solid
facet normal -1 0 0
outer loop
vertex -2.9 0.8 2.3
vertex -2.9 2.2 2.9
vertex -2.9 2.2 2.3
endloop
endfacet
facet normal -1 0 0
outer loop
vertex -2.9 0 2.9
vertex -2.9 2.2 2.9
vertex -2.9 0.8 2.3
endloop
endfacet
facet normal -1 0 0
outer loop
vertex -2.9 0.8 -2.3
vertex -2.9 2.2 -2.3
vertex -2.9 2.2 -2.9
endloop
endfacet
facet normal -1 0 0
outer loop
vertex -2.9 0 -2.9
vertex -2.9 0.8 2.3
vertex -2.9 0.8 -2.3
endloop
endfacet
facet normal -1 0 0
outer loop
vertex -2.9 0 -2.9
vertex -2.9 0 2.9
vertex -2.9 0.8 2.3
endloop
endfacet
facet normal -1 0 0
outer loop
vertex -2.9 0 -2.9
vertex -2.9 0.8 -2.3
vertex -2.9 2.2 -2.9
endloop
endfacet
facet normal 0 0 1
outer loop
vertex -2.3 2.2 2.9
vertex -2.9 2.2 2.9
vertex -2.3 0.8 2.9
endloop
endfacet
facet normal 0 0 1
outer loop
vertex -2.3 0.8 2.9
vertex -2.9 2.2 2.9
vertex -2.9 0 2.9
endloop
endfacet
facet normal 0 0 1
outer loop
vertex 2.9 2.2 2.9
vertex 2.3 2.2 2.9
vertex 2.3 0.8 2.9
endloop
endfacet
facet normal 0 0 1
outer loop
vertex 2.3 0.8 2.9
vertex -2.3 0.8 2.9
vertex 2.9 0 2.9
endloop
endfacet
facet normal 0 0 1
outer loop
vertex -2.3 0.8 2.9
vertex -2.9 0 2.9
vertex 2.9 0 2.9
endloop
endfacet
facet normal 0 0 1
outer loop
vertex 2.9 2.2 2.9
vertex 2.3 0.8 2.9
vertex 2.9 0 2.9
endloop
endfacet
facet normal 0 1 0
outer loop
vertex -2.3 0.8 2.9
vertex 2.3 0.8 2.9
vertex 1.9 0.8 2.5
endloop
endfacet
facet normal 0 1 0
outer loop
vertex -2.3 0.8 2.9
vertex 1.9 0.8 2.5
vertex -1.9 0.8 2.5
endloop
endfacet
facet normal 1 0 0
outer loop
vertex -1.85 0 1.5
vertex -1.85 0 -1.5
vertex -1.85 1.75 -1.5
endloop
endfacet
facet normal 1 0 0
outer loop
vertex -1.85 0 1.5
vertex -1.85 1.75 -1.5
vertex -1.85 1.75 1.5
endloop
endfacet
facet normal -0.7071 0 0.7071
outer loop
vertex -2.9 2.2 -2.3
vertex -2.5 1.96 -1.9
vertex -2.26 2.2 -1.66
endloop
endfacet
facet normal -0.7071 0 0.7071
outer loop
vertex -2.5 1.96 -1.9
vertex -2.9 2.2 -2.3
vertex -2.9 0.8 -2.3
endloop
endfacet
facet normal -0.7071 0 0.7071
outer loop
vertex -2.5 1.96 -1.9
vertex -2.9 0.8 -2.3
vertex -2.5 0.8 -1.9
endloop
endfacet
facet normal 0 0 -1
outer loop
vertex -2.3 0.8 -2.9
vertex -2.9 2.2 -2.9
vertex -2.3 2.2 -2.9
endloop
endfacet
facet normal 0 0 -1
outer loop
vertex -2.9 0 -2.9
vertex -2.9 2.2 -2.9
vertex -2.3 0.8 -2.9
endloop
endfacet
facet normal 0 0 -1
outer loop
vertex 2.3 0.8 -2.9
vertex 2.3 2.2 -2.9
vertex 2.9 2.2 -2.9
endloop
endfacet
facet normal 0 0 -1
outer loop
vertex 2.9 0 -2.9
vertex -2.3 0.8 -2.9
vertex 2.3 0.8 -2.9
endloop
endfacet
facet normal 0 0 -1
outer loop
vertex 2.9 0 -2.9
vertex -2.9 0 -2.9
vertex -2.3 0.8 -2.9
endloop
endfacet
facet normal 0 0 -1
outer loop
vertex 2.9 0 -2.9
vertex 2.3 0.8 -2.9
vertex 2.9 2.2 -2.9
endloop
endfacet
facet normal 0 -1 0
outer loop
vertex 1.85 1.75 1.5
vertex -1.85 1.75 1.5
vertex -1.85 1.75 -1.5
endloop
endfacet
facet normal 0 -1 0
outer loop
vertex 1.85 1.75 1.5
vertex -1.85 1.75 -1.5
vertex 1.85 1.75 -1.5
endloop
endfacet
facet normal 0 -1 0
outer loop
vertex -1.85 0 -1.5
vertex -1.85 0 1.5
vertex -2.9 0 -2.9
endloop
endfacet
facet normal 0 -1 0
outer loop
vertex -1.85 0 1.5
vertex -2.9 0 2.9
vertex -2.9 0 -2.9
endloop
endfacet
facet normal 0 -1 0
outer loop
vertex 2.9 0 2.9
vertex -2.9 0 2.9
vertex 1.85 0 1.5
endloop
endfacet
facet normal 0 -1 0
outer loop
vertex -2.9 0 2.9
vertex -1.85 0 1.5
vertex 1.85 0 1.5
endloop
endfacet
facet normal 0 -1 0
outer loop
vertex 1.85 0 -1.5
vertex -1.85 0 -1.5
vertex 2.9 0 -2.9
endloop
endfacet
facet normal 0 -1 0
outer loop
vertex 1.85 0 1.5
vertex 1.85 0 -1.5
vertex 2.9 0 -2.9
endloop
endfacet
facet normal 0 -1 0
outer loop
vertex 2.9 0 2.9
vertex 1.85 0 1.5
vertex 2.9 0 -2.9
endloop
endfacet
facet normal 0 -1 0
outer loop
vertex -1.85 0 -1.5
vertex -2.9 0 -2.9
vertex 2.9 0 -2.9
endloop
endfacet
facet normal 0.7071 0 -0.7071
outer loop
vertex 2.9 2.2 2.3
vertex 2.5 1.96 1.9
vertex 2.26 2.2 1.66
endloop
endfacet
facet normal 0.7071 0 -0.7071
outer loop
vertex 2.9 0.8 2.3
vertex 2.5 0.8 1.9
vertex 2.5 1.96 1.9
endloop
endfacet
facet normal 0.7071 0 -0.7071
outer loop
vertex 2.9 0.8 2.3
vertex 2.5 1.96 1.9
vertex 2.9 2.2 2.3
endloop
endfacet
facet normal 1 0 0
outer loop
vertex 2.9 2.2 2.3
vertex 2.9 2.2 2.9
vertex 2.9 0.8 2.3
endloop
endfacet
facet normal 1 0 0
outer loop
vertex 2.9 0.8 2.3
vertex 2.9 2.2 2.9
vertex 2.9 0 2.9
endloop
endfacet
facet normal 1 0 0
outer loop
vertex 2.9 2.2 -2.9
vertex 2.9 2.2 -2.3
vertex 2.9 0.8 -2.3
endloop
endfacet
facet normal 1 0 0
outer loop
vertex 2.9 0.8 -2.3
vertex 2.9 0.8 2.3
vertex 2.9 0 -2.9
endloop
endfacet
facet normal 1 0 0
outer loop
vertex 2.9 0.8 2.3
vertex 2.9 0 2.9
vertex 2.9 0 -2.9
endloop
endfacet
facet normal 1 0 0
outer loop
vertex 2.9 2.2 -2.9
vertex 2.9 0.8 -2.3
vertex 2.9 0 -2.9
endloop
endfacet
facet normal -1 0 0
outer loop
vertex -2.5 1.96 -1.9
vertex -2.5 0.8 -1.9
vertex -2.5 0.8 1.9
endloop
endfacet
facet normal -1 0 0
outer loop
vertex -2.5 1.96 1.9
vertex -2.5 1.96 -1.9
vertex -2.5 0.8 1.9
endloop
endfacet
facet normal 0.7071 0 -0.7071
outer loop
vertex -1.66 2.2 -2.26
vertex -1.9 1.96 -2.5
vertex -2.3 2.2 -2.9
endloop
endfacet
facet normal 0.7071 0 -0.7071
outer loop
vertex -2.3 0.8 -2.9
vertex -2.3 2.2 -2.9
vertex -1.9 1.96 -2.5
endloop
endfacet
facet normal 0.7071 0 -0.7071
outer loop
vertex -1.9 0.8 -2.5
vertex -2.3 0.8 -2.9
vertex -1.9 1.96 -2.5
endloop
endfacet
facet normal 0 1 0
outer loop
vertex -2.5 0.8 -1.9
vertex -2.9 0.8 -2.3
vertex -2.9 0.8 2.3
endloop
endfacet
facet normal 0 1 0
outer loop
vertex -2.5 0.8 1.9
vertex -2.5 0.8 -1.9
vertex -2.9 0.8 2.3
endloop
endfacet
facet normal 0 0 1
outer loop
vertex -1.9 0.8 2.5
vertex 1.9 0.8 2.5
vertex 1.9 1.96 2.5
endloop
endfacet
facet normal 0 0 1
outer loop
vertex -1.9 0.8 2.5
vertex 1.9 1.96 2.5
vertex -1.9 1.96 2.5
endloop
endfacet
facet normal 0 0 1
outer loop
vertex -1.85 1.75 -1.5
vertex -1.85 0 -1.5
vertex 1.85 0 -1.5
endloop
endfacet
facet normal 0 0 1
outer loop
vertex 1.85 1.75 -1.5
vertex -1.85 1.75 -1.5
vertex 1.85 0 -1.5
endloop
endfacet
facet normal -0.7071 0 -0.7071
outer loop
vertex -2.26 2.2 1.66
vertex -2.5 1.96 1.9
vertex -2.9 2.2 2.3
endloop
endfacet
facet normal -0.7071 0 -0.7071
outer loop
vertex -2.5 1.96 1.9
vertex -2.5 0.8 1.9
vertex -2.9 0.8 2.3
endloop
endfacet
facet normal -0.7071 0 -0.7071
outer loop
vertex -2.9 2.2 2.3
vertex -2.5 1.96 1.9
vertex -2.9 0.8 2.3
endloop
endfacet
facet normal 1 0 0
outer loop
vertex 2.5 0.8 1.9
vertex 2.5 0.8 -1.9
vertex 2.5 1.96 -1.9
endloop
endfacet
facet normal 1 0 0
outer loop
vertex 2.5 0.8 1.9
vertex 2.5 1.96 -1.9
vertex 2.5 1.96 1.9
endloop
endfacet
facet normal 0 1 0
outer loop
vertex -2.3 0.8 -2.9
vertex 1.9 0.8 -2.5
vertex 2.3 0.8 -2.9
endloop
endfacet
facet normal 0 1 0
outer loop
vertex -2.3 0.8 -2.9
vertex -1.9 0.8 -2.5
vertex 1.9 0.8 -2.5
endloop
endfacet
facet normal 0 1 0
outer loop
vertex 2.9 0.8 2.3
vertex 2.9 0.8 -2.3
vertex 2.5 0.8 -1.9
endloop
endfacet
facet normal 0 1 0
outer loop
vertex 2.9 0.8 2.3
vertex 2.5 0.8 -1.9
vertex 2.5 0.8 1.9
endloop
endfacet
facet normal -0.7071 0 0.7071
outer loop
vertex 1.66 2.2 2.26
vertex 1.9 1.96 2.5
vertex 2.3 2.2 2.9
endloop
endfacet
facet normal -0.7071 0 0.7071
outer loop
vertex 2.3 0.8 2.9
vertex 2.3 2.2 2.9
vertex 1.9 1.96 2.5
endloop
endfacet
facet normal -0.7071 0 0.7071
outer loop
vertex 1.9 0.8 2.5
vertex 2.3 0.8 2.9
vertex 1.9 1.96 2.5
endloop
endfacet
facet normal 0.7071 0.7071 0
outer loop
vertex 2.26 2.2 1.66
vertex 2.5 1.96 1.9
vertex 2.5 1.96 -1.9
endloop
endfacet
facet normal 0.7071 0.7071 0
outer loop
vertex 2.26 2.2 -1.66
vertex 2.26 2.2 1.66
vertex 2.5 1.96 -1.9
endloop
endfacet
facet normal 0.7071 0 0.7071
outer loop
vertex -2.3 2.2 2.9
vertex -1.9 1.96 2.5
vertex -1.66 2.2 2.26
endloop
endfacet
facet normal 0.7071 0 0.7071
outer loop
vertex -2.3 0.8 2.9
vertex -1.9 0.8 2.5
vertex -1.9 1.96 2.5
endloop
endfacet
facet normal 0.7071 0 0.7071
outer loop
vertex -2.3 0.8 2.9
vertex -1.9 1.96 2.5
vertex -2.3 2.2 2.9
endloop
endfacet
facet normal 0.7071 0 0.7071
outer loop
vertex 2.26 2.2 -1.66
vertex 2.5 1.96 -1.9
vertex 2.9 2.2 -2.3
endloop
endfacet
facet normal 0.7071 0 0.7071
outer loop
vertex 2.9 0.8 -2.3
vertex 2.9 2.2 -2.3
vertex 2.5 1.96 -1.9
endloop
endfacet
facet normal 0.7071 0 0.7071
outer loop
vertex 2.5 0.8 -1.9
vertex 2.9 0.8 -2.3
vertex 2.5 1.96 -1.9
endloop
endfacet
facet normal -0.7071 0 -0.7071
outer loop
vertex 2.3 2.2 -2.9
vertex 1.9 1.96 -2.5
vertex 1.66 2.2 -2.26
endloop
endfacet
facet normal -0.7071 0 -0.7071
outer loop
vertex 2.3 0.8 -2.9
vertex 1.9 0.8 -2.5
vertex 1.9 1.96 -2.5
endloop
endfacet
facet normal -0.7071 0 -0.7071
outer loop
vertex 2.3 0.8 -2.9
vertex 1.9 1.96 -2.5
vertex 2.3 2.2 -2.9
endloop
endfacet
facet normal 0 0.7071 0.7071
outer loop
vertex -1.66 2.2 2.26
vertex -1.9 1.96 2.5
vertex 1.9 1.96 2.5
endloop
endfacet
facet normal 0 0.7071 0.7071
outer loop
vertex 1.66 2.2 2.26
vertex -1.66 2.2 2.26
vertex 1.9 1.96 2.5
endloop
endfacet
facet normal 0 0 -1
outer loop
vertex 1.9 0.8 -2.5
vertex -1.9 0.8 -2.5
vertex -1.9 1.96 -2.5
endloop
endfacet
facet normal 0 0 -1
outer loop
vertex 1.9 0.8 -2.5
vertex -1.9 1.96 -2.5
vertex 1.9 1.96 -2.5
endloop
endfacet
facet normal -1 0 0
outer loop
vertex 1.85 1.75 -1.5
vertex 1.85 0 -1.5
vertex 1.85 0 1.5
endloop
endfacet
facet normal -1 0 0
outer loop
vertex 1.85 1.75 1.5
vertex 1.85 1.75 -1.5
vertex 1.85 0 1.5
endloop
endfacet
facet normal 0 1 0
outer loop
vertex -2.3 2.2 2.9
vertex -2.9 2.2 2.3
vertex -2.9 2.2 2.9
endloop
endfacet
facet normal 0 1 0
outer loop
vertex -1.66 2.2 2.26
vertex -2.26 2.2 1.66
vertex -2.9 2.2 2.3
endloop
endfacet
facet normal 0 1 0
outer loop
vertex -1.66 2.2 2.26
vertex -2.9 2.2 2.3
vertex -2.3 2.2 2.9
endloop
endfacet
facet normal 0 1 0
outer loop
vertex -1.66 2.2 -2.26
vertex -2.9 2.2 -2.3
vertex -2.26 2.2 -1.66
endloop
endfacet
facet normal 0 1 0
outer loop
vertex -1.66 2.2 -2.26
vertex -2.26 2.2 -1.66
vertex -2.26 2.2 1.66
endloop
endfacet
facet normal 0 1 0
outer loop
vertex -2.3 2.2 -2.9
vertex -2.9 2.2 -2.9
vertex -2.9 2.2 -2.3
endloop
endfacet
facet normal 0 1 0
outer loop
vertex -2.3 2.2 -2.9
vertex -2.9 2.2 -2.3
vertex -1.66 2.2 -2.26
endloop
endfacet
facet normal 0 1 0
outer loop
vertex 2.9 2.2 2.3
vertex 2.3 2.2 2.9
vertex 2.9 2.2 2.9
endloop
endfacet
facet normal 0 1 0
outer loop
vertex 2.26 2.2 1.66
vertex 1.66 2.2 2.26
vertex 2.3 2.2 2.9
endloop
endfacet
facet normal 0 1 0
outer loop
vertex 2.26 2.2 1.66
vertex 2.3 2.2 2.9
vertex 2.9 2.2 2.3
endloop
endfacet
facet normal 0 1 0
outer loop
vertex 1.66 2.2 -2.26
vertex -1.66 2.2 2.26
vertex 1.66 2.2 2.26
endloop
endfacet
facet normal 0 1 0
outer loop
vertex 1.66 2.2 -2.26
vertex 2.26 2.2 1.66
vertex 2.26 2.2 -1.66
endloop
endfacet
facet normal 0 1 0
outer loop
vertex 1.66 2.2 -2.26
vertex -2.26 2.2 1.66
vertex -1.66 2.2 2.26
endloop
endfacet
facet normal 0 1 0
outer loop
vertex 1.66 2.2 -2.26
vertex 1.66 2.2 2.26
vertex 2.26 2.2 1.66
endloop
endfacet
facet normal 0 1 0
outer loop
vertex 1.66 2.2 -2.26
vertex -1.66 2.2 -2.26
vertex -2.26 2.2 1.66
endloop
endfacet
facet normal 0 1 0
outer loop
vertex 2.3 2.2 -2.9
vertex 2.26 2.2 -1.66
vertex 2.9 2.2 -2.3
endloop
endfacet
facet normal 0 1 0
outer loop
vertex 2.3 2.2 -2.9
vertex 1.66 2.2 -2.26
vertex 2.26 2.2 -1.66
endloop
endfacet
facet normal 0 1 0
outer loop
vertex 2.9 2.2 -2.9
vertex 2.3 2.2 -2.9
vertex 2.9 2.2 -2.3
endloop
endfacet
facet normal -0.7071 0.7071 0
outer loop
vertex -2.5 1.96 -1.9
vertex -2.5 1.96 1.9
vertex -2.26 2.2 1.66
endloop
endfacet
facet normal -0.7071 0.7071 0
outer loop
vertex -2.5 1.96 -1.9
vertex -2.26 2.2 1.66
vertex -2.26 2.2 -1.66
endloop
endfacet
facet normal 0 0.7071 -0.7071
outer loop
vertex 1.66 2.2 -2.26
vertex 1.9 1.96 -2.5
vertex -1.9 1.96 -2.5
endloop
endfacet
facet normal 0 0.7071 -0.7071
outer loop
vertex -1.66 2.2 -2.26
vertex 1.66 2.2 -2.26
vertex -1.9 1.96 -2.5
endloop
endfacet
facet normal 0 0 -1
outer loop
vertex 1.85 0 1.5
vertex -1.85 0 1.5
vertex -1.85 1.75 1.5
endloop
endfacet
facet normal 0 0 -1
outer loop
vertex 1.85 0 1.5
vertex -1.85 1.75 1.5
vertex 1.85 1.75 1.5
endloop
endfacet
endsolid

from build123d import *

# Parameters (mm, degrees)
SKETCH_1_W          = 5.8
SKETCH_1_H          = 5.8
EXTRUDE_1_DEPTH     = 2.2
SKETCH_3_W          = 3.7
SKETCH_3_H          = 3
CUT_EXTRUDE_2_DEPTH = 1.75
CUT_EXTRUDE_START   = -0.8
CUT_EXTRUDE_1_DEPTH = 4.854030511
CHAMFER_1_SIZE      = 0.24


with BuildPart() as part:
    # 草图1 → 凸台-拉伸1 (new body)
    with BuildSketch(Plane(origin=(0, 0, 0), x_dir=(1, 0, 0), z_dir=(0, 1, 0))):
        Rectangle(SKETCH_1_W, SKETCH_1_H)
    extrude(amount=EXTRUDE_1_DEPTH)

    # 草图3 → 切除-拉伸2 (cut)
    with BuildSketch(Plane.XZ):
        Rectangle(SKETCH_3_W, SKETCH_3_H)
    extrude(amount=-CUT_EXTRUDE_2_DEPTH, mode=Mode.SUBTRACT)

    # 草图2 → 切除-拉伸1 (cut, through all)
    with BuildSketch(Plane.XZ.offset(CUT_EXTRUDE_START)):
        Polygon((-2.9, 2.3), (-2.9, -2.3), (-2.5, -1.9), (-2.5, 1.9), align=None)
        Polygon((-1.9, 2.5), (-2.3, 2.9), (2.3, 2.9), (1.9, 2.5), align=None)
        Polygon((2.5, 1.9), (2.9, 2.3), (2.9, -2.3), (2.5, -1.9), align=None)
        Polygon((1.9, -2.5), (2.3, -2.9), (-2.3, -2.9), (-1.9, -2.5), align=None)
    extrude(amount=-CUT_EXTRUDE_1_DEPTH, mode=Mode.SUBTRACT)

    # 倒角1
    chamfer_1_edges = [part.edges().sort_by_distance(p)[0] for p in [
        (-2.5, 2.2, 0),
        (0, 2.2, 2.5),
        (2.5, 2.2, 0),
        (0, 2.2, -2.5),
    ]]
    chamfer(chamfer_1_edges, length=CHAMFER_1_SIZE)


solid = part.part
